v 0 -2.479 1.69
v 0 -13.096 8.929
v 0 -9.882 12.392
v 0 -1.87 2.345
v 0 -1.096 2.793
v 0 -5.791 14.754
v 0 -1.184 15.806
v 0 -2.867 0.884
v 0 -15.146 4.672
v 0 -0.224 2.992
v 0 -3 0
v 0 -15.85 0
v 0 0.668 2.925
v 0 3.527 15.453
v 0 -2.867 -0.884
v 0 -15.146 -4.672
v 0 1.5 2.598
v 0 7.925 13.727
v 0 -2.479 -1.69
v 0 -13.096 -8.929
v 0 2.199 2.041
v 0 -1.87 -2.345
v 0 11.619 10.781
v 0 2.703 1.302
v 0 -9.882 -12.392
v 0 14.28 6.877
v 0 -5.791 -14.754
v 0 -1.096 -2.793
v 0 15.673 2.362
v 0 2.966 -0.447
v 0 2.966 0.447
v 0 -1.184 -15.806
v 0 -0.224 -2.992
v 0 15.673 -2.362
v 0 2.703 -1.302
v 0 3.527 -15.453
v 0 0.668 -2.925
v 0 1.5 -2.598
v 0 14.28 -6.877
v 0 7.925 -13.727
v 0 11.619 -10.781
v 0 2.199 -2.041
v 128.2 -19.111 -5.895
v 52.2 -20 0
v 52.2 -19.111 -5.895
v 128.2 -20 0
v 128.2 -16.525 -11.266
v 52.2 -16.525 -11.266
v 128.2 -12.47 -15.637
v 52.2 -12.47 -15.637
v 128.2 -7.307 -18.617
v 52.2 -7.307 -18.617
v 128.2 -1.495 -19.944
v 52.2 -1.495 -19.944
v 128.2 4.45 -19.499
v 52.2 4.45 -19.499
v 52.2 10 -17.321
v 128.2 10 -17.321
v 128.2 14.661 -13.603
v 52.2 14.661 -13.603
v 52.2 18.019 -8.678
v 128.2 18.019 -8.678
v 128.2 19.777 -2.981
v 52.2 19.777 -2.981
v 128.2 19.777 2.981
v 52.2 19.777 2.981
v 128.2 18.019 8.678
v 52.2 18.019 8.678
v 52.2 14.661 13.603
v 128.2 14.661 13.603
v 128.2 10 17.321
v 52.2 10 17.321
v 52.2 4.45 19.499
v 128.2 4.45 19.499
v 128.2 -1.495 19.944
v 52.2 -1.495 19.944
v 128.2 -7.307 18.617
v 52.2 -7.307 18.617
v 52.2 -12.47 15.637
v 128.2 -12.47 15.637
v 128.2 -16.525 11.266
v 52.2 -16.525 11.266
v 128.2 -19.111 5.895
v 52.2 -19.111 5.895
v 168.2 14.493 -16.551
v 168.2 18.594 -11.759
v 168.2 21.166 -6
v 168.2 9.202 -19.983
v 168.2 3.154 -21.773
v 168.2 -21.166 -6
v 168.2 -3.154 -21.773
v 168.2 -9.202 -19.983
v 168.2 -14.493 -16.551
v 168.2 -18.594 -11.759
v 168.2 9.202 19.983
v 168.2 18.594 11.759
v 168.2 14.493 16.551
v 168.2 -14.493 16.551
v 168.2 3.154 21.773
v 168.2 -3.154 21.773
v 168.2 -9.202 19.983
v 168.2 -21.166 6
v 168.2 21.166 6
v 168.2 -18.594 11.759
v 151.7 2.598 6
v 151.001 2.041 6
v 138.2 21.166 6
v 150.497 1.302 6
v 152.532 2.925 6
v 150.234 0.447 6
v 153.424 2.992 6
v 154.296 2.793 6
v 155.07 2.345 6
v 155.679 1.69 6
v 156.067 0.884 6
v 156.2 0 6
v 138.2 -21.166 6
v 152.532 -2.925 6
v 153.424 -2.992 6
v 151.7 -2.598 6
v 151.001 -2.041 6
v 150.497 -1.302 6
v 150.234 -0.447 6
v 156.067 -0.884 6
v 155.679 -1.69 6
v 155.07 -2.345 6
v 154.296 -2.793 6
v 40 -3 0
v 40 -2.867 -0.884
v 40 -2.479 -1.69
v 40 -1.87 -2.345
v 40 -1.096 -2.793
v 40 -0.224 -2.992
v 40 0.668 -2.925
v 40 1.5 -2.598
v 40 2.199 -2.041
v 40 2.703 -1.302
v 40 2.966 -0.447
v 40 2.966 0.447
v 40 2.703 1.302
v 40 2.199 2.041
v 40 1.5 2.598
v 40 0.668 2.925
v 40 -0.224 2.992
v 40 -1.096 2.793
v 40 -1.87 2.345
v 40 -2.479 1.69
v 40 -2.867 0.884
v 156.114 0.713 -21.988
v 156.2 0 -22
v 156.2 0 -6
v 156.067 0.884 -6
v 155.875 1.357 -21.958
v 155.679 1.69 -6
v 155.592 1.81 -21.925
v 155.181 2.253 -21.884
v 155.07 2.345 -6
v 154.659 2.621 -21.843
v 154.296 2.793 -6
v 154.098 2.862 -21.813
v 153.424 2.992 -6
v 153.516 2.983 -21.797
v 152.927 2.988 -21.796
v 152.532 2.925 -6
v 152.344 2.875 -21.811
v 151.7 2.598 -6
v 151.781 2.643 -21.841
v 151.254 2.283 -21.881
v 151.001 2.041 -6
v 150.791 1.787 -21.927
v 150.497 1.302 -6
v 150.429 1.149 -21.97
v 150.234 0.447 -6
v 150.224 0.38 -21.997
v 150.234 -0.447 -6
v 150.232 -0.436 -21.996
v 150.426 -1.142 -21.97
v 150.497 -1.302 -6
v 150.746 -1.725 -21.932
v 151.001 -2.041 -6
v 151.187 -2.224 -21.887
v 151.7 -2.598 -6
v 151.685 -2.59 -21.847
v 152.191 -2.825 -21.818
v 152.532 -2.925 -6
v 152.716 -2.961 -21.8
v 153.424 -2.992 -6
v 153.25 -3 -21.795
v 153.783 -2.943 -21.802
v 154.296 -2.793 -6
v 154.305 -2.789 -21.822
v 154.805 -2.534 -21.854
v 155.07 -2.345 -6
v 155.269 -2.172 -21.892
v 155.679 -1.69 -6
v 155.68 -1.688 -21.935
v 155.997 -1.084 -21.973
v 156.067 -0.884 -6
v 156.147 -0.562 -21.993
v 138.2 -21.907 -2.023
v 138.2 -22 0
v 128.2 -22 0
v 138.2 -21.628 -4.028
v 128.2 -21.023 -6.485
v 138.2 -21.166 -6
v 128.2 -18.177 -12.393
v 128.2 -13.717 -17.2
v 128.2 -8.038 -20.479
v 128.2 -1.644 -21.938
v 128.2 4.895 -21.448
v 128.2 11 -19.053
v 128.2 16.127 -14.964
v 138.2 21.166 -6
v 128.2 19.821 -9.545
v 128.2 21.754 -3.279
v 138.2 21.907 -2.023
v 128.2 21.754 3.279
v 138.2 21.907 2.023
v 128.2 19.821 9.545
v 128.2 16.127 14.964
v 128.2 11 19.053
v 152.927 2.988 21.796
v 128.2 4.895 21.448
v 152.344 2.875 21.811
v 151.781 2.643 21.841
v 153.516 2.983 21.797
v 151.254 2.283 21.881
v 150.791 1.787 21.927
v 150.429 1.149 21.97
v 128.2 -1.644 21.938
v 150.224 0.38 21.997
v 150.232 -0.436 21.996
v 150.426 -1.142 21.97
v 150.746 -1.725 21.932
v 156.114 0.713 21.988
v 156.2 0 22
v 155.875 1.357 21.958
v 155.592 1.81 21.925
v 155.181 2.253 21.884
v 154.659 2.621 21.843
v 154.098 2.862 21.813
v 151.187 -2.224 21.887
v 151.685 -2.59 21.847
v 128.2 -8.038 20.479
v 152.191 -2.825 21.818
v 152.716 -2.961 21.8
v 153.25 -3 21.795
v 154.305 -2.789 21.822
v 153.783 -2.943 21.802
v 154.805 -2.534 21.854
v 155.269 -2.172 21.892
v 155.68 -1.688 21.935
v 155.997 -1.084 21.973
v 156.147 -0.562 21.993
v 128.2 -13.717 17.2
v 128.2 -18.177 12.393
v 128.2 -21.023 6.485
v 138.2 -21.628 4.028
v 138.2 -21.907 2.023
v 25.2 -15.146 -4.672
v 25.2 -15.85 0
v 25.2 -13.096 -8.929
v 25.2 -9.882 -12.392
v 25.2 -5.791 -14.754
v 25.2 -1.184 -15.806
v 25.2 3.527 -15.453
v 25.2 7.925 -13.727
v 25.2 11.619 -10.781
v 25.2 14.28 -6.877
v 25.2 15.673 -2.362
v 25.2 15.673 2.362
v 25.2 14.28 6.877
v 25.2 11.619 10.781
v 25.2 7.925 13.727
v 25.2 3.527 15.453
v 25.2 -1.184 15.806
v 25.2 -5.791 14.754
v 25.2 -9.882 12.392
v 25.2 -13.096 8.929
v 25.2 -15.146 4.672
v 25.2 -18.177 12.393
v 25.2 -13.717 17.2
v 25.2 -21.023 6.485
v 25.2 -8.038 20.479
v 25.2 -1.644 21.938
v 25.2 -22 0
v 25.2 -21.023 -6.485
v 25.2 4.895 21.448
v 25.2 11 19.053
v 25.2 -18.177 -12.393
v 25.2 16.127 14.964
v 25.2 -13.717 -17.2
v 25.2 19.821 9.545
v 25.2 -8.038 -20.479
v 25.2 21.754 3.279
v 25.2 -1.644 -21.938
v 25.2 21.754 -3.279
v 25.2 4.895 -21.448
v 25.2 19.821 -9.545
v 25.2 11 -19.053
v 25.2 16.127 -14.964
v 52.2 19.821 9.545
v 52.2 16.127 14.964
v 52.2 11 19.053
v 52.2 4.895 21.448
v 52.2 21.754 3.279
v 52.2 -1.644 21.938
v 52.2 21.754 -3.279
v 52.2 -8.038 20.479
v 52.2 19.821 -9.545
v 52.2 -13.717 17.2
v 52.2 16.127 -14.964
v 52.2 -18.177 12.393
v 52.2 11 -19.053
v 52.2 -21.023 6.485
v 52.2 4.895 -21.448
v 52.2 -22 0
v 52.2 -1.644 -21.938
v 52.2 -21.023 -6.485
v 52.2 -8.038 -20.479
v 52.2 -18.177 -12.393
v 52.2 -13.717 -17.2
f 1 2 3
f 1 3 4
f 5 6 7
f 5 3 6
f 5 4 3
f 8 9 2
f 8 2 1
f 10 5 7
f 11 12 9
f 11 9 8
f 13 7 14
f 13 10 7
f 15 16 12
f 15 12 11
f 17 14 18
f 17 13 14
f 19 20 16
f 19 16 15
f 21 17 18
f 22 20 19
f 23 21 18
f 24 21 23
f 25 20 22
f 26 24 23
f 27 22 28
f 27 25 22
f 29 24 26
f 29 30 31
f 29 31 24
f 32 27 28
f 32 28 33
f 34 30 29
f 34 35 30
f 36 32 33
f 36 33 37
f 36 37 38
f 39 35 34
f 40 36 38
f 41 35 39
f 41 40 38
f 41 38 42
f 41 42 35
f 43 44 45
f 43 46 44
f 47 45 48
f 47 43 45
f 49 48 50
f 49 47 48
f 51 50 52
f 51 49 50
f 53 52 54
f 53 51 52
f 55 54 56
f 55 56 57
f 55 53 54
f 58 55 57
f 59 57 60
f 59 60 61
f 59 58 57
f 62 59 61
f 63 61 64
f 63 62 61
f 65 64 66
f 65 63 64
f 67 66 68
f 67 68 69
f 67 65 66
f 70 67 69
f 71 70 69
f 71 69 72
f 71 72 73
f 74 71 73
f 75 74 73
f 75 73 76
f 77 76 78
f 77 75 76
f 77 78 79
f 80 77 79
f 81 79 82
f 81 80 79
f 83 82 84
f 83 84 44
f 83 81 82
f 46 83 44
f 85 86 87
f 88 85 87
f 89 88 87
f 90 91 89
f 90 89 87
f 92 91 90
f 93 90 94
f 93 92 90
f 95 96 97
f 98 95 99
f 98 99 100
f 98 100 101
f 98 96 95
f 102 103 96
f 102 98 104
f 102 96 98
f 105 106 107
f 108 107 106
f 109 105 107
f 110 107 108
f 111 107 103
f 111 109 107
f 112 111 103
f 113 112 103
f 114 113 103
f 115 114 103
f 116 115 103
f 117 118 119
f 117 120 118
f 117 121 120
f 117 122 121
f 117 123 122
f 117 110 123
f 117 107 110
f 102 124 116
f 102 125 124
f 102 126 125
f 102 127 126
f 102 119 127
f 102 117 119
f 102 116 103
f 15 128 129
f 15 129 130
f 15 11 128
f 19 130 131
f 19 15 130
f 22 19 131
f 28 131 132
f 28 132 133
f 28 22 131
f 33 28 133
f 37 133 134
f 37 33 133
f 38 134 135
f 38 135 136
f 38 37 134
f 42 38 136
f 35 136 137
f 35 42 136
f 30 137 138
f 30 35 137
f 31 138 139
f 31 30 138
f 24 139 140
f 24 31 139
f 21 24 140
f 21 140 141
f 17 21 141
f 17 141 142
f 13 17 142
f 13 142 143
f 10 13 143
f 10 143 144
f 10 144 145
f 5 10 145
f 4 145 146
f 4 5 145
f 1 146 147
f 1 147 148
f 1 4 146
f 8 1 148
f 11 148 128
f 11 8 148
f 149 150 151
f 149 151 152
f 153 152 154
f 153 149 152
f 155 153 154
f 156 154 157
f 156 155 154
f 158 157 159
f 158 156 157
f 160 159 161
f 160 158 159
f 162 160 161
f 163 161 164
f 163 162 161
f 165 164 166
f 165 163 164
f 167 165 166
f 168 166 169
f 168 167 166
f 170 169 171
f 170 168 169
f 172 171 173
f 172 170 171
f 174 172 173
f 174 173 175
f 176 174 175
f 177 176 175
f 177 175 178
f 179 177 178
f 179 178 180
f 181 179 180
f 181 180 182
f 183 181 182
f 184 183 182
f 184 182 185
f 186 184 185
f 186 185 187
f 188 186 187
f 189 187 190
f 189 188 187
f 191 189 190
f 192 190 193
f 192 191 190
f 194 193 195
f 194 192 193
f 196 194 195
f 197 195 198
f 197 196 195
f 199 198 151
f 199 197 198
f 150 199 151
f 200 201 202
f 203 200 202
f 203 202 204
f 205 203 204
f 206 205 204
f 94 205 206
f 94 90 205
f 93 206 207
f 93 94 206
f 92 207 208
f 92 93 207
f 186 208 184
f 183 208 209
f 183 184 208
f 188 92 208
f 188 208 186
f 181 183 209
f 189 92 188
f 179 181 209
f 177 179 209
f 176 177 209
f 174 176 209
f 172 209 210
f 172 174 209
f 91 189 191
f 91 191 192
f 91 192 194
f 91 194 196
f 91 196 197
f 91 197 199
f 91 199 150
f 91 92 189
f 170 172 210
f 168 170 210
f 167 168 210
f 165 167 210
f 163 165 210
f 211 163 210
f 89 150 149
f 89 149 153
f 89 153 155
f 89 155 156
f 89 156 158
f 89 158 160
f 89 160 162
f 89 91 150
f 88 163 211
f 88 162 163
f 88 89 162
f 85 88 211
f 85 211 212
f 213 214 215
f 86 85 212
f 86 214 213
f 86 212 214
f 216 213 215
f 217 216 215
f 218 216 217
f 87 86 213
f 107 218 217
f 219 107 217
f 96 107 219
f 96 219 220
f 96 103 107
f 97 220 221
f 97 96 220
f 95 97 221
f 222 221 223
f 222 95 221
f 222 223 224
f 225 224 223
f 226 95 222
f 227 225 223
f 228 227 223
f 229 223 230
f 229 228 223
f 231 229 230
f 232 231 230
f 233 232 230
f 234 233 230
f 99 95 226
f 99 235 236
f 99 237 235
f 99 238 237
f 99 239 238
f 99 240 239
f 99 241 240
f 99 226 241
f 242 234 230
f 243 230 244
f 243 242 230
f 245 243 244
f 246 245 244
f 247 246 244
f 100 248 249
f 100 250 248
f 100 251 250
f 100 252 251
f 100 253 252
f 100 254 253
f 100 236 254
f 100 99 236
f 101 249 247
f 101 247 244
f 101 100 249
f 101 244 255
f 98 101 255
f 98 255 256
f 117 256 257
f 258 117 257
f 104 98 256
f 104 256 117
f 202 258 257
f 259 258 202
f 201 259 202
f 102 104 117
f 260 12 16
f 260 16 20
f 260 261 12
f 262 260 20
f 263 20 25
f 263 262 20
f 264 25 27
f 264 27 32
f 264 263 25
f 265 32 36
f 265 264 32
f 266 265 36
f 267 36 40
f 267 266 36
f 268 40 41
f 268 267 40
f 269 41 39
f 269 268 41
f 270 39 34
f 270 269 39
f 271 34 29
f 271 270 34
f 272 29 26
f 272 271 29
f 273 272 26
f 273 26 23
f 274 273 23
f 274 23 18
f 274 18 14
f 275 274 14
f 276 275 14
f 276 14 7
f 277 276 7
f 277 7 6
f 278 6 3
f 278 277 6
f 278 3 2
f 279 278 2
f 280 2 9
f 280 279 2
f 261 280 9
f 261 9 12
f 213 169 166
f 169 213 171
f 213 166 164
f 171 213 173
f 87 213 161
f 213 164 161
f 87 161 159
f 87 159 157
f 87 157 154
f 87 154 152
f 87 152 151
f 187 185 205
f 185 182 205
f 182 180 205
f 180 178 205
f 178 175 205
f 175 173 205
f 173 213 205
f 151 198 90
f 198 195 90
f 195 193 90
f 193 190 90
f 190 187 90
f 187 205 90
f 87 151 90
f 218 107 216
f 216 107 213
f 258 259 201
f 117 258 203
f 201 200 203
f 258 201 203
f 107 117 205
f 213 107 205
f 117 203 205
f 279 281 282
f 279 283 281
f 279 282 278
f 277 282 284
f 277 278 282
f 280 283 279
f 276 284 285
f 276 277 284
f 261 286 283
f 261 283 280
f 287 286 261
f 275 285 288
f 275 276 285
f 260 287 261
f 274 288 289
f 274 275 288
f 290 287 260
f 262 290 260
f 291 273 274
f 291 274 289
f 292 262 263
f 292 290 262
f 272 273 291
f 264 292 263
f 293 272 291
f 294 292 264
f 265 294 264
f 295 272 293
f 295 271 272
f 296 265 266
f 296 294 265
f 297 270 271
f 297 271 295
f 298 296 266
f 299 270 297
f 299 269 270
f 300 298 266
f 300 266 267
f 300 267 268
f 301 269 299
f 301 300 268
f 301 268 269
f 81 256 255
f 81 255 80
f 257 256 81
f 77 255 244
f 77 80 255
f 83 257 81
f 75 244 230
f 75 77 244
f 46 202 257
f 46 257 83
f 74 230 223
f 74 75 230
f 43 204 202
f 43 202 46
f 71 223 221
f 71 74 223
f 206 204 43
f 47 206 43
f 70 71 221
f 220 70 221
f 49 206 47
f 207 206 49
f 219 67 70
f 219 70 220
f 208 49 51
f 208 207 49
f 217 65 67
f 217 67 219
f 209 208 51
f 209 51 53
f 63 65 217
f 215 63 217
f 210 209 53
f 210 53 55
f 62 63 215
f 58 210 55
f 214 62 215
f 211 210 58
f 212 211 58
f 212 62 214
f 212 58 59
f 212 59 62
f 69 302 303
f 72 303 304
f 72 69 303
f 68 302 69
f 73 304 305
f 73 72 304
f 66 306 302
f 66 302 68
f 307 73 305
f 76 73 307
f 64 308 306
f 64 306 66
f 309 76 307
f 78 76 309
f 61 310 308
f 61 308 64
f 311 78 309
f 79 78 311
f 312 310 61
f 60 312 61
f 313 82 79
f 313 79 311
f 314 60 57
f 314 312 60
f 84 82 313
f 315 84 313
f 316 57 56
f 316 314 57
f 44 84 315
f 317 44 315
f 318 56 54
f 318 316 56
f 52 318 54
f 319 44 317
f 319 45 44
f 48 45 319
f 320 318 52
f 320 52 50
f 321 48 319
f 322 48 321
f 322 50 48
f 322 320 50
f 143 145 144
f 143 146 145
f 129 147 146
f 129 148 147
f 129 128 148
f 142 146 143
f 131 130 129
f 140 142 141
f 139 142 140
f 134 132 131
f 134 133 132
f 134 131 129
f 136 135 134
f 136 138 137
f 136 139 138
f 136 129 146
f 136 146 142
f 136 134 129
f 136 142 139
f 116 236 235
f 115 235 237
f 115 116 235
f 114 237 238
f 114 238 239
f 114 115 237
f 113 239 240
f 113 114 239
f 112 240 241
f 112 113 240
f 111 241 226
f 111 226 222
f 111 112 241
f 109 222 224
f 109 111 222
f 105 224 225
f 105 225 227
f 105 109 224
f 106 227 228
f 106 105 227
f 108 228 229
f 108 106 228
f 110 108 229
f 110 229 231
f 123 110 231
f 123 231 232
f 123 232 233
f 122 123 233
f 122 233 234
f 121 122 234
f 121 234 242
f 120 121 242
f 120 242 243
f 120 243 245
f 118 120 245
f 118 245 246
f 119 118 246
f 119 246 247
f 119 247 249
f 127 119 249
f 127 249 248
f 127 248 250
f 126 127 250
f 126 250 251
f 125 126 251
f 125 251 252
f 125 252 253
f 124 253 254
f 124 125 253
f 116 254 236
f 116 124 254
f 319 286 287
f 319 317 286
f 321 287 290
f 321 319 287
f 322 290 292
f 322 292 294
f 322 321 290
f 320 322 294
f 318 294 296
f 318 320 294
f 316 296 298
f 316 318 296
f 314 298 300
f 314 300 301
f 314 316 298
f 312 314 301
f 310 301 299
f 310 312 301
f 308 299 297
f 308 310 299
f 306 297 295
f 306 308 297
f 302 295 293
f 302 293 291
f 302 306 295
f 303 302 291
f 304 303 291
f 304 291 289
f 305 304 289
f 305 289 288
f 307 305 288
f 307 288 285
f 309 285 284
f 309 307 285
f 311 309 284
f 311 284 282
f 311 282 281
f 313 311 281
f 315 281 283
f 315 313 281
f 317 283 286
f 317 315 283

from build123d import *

# Parameters (mm, degrees)
ENL_V_MAT_EXTRU_1_DEPTH      = 172.053325019
ENL_V_MAT_EXTRU_1_DEPTH_BACK = 172.053325019
ESQUISSE2_W                  = 30
ESQUISSE2_H                  = 12
ENL_V_MAT_EXTRU_2_DEPTH      = 172.928008189
ENL_V_MAT_EXTRU_2_DEPTH_BACK = 172.928008189
ESQUISSE3_R                  = 3


with BuildPart() as part:
    # Esquisse1 → Révolution1 (revolve)
    with BuildSketch(Plane.XY, mode=Mode.PRIVATE) as r_volution1_sk:
        Polygon((40, 3), (0, 3), (0, 15.85), (25.2, 15.85), (25.2, 22), (52.2, 22), (52.2, 20), (128.2, 20), (128.2, 22), (168.2, 22), (168.2, 0), (40, 0), align=None)
    revolve(r_volution1_sk.sketch.rotate(Axis((40, 0, 0), (1, 0, 0)), 180), axis=Axis((40, 0, 0), (1, 0, 0)))

    # Esquisse2 → Enlèv. mat.-Extru.1 (cut, two sides: drawn at the far end of the back side and taken through both)
    with BuildSketch(Plane(origin=(0, 0, 0), x_dir=(1, 0, 0), z_dir=(0, 1, 0)).offset(-ENL_V_MAT_EXTRU_1_DEPTH_BACK)):
        with Locations((153.2, 0)):
            Rectangle(ESQUISSE2_W, ESQUISSE2_H)
    extrude(amount=ENL_V_MAT_EXTRU_1_DEPTH + ENL_V_MAT_EXTRU_1_DEPTH_BACK, mode=Mode.SUBTRACT)

    # Esquisse3 → Enlèv. mat.-Extru.2 (cut, two sides: drawn at the far end of the back side and taken through both)
    with BuildSketch(Plane.XY.offset(-6).offset(-ENL_V_MAT_EXTRU_2_DEPTH_BACK)):
        with Locations((153.2, 0)):
            Circle(ESQUISSE3_R)
    extrude(amount=ENL_V_MAT_EXTRU_2_DEPTH + ENL_V_MAT_EXTRU_2_DEPTH_BACK, mode=Mode.SUBTRACT)


solid = part.part
